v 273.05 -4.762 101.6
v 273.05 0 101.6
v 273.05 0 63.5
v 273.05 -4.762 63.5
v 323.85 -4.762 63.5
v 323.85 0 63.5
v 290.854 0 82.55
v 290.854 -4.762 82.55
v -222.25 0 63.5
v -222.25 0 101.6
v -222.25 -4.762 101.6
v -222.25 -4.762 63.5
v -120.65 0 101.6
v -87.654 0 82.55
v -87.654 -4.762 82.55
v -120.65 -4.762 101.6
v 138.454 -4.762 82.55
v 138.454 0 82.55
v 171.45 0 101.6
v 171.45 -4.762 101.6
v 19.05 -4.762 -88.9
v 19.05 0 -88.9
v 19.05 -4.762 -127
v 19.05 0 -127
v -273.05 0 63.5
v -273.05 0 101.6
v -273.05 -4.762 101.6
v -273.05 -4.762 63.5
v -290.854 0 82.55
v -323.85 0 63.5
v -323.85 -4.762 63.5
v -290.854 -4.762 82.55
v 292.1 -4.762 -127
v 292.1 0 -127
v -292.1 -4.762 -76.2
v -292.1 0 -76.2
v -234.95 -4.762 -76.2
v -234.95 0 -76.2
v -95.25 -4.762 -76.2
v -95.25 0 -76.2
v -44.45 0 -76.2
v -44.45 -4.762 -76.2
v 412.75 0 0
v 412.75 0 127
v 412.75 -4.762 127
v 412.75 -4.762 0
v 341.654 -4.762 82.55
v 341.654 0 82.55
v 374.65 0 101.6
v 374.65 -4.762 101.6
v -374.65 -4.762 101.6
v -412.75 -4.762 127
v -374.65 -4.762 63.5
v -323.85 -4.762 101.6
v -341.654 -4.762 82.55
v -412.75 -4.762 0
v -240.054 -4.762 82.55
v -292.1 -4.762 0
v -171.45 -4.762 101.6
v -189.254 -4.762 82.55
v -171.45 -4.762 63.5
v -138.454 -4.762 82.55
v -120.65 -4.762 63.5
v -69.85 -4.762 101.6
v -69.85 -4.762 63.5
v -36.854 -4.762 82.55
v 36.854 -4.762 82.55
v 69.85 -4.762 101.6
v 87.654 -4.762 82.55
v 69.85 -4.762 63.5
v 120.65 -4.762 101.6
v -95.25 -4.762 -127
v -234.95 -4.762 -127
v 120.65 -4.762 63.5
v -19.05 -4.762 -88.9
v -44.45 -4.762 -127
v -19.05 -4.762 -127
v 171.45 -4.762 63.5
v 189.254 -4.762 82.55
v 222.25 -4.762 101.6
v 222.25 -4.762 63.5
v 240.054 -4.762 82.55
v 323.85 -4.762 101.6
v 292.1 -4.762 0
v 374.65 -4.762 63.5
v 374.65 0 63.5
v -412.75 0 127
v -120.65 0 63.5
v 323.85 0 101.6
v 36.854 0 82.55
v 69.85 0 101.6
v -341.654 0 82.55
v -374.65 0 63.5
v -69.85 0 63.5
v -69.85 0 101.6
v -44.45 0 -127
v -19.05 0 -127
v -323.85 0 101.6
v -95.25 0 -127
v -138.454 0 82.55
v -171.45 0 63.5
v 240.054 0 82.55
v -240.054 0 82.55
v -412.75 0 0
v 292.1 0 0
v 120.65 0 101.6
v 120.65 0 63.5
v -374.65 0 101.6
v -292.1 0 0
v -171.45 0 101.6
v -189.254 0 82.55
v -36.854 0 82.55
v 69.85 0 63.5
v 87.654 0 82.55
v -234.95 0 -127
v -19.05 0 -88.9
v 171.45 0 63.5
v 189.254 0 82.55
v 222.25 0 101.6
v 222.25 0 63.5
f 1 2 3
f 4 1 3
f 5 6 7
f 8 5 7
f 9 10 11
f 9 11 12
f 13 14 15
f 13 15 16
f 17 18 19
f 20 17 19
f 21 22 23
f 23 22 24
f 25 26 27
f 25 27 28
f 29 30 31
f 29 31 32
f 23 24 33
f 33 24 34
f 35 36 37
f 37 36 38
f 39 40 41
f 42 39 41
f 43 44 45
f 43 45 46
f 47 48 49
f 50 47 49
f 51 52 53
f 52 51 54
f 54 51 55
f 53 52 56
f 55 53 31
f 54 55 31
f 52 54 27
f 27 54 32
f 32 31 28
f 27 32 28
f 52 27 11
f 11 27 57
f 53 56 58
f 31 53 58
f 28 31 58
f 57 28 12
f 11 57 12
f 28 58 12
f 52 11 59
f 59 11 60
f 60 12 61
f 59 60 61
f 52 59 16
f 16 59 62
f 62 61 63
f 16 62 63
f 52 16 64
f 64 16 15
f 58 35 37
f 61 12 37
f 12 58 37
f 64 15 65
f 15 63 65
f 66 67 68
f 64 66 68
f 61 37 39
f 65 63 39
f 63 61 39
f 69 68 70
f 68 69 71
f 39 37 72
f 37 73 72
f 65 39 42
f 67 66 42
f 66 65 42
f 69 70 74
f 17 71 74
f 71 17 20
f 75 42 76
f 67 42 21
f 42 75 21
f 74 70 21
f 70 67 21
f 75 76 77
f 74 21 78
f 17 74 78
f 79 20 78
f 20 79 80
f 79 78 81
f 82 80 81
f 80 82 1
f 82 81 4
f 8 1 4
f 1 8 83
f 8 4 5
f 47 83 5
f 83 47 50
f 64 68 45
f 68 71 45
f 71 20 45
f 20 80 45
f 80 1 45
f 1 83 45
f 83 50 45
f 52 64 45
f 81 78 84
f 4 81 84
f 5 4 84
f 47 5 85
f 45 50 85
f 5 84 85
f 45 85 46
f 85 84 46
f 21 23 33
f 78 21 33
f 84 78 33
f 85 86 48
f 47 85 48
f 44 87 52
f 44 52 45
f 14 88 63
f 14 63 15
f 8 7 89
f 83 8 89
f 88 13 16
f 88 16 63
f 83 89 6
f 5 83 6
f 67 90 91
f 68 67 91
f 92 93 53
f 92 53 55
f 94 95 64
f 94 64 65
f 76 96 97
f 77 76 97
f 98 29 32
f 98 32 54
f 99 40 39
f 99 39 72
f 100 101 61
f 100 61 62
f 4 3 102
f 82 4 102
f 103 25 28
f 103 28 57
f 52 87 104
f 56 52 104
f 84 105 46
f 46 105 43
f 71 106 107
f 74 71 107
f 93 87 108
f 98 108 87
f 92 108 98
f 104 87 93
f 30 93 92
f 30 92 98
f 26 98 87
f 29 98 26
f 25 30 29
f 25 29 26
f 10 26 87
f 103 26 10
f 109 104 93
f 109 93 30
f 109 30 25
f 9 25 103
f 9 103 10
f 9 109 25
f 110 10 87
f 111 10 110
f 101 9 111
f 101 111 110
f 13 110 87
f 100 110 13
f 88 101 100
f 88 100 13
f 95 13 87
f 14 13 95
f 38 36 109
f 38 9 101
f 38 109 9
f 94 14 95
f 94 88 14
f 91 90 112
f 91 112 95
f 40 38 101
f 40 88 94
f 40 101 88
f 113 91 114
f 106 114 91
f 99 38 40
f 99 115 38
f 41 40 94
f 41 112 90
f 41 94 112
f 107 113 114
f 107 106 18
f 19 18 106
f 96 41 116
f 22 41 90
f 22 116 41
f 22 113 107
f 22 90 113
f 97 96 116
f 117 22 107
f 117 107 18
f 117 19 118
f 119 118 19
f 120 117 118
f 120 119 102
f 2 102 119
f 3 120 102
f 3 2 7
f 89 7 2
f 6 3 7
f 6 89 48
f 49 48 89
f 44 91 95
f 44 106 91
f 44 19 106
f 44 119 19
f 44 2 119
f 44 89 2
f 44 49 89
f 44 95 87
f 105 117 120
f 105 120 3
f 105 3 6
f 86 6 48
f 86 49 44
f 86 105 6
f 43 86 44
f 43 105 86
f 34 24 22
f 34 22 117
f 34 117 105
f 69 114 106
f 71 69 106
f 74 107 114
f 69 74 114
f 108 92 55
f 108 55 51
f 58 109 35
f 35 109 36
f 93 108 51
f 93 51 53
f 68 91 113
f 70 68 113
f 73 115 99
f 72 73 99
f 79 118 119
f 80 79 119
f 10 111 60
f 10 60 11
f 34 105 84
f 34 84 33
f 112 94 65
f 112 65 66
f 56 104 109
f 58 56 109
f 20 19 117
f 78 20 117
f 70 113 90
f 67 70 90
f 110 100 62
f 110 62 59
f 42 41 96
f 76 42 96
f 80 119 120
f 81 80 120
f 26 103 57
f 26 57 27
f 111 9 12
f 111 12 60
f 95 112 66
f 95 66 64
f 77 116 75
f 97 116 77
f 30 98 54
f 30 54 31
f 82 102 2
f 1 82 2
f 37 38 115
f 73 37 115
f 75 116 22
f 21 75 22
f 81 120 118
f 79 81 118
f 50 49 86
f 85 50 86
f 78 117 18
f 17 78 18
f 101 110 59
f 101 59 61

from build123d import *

# Parameters (mm, degrees)
SKETCH1_W          = 825.5
SKETCH1_H          = 254
BASE_FLANGE1_DEPTH = 4.7625
SKETCH6_W          = 38.1
SKETCH6_H          = 76.2
SKETCH6_W_2        = 241.3
SKETCH6_H_2        = 101.6
SKETCH6_W_3        = 50.8
CUT_EXTRUDE1_DEPTH = 432.872948801
SKETCH7_W          = 177.8
SKETCH7_H          = 50.8
SKETCH7_W_2        = 120.65
SKETCH7_H_2        = 25.4
CUT_EXTRUDE2_DEPTH = 432.872948801
CUT_EXTRUDE3_DEPTH = 432.872948801


# Sheet-metal steps are written as plain solids
with BuildPart() as part:
    # Sketch1 → Base-Flange1 (new body)
    with BuildSketch(Plane(origin=(0, 0, 0), x_dir=(1, 0, 0), z_dir=(0, 1, 0))):
        Rectangle(SKETCH1_W, SKETCH1_H)
    extrude(amount=-BASE_FLANGE1_DEPTH)

    # Sketch6 → Cut-Extrude1 (cut, through all)
    with BuildSketch(Plane(origin=(0, 0, 0), x_dir=(1, 0, 0), z_dir=(0, 1, 0))):
        with Locations((0, 127)):
            Rectangle(SKETCH6_W, SKETCH6_H)
        with Locations((-412.75, 50.8)):
            Rectangle(SKETCH6_W_2, SKETCH6_H_2)
        with Locations((412.75, 50.8)):
            Rectangle(SKETCH6_W_2, SKETCH6_H_2)
        with Locations((-69.85, 127)):
            Rectangle(SKETCH6_W_3, SKETCH6_H_2)
    extrude(amount=-CUT_EXTRUDE1_DEPTH, mode=Mode.SUBTRACT)

    # Sketch7 → Cut-Extrude2 (cut, through all)
    with BuildSketch(Plane(origin=(0, 0, 0), x_dir=(1, 0, 0), z_dir=(0, 1, 0))):
        with Locations((-323.85, 101.6)):
            Rectangle(SKETCH7_W, SKETCH7_H)
        with Locations((352.425, 114.3)):
            Rectangle(SKETCH7_W_2, SKETCH7_H_2)
    extrude(amount=-CUT_EXTRUDE2_DEPTH, mode=Mode.SUBTRACT)

    # Sketch8 → Cut-Extrude3 (cut, through all)
    with BuildSketch(Plane(origin=(0, 0, 0), x_dir=(1, 0, 0), z_dir=(0, 1, 0))):
        Polygon((341.654432116, -82.55), (374.65, -101.6), (374.65, -63.5), align=None)
        Polygon((323.85, -101.6), (323.85, -63.5), (290.854432116, -82.55), align=None)
        Polygon((273.05, -101.6), (273.05, -63.5), (240.054432116, -82.55), align=None)
        Polygon((222.25, -101.6), (222.25, -63.5), (189.254432116, -82.55), align=None)
        Polygon((171.45, -101.6), (171.45, -63.5), (138.454432116, -82.55), align=None)
        Polygon((120.65, -101.6), (120.65, -63.5), (87.654432116, -82.55), align=None)
        Polygon((69.85, -101.6), (69.85, -63.5), (36.854432116, -82.55), align=None)
        Polygon((-36.854432116, -82.55), (-69.85, -101.6), (-69.85, -63.5), align=None)
        Polygon((-87.654432116, -82.55), (-120.65, -101.6), (-120.65, -63.5), align=None)
        Polygon((-138.454432116, -82.55), (-171.45, -101.6), (-171.45, -63.5), align=None)
        Polygon((-189.254432116, -82.55), (-222.25, -101.6), (-222.25, -63.5), align=None)
        Polygon((-240.054432116, -82.55), (-273.05, -101.6), (-273.05, -63.5), align=None)
        Polygon((-290.854432116, -82.55), (-323.85, -101.6), (-323.85, -63.5), align=None)
        Polygon((-374.65, -63.5), (-341.654432116, -82.55), (-374.65, -101.6), align=None)
    extrude(amount=-CUT_EXTRUDE3_DEPTH, mode=Mode.SUBTRACT)


solid = part.part
